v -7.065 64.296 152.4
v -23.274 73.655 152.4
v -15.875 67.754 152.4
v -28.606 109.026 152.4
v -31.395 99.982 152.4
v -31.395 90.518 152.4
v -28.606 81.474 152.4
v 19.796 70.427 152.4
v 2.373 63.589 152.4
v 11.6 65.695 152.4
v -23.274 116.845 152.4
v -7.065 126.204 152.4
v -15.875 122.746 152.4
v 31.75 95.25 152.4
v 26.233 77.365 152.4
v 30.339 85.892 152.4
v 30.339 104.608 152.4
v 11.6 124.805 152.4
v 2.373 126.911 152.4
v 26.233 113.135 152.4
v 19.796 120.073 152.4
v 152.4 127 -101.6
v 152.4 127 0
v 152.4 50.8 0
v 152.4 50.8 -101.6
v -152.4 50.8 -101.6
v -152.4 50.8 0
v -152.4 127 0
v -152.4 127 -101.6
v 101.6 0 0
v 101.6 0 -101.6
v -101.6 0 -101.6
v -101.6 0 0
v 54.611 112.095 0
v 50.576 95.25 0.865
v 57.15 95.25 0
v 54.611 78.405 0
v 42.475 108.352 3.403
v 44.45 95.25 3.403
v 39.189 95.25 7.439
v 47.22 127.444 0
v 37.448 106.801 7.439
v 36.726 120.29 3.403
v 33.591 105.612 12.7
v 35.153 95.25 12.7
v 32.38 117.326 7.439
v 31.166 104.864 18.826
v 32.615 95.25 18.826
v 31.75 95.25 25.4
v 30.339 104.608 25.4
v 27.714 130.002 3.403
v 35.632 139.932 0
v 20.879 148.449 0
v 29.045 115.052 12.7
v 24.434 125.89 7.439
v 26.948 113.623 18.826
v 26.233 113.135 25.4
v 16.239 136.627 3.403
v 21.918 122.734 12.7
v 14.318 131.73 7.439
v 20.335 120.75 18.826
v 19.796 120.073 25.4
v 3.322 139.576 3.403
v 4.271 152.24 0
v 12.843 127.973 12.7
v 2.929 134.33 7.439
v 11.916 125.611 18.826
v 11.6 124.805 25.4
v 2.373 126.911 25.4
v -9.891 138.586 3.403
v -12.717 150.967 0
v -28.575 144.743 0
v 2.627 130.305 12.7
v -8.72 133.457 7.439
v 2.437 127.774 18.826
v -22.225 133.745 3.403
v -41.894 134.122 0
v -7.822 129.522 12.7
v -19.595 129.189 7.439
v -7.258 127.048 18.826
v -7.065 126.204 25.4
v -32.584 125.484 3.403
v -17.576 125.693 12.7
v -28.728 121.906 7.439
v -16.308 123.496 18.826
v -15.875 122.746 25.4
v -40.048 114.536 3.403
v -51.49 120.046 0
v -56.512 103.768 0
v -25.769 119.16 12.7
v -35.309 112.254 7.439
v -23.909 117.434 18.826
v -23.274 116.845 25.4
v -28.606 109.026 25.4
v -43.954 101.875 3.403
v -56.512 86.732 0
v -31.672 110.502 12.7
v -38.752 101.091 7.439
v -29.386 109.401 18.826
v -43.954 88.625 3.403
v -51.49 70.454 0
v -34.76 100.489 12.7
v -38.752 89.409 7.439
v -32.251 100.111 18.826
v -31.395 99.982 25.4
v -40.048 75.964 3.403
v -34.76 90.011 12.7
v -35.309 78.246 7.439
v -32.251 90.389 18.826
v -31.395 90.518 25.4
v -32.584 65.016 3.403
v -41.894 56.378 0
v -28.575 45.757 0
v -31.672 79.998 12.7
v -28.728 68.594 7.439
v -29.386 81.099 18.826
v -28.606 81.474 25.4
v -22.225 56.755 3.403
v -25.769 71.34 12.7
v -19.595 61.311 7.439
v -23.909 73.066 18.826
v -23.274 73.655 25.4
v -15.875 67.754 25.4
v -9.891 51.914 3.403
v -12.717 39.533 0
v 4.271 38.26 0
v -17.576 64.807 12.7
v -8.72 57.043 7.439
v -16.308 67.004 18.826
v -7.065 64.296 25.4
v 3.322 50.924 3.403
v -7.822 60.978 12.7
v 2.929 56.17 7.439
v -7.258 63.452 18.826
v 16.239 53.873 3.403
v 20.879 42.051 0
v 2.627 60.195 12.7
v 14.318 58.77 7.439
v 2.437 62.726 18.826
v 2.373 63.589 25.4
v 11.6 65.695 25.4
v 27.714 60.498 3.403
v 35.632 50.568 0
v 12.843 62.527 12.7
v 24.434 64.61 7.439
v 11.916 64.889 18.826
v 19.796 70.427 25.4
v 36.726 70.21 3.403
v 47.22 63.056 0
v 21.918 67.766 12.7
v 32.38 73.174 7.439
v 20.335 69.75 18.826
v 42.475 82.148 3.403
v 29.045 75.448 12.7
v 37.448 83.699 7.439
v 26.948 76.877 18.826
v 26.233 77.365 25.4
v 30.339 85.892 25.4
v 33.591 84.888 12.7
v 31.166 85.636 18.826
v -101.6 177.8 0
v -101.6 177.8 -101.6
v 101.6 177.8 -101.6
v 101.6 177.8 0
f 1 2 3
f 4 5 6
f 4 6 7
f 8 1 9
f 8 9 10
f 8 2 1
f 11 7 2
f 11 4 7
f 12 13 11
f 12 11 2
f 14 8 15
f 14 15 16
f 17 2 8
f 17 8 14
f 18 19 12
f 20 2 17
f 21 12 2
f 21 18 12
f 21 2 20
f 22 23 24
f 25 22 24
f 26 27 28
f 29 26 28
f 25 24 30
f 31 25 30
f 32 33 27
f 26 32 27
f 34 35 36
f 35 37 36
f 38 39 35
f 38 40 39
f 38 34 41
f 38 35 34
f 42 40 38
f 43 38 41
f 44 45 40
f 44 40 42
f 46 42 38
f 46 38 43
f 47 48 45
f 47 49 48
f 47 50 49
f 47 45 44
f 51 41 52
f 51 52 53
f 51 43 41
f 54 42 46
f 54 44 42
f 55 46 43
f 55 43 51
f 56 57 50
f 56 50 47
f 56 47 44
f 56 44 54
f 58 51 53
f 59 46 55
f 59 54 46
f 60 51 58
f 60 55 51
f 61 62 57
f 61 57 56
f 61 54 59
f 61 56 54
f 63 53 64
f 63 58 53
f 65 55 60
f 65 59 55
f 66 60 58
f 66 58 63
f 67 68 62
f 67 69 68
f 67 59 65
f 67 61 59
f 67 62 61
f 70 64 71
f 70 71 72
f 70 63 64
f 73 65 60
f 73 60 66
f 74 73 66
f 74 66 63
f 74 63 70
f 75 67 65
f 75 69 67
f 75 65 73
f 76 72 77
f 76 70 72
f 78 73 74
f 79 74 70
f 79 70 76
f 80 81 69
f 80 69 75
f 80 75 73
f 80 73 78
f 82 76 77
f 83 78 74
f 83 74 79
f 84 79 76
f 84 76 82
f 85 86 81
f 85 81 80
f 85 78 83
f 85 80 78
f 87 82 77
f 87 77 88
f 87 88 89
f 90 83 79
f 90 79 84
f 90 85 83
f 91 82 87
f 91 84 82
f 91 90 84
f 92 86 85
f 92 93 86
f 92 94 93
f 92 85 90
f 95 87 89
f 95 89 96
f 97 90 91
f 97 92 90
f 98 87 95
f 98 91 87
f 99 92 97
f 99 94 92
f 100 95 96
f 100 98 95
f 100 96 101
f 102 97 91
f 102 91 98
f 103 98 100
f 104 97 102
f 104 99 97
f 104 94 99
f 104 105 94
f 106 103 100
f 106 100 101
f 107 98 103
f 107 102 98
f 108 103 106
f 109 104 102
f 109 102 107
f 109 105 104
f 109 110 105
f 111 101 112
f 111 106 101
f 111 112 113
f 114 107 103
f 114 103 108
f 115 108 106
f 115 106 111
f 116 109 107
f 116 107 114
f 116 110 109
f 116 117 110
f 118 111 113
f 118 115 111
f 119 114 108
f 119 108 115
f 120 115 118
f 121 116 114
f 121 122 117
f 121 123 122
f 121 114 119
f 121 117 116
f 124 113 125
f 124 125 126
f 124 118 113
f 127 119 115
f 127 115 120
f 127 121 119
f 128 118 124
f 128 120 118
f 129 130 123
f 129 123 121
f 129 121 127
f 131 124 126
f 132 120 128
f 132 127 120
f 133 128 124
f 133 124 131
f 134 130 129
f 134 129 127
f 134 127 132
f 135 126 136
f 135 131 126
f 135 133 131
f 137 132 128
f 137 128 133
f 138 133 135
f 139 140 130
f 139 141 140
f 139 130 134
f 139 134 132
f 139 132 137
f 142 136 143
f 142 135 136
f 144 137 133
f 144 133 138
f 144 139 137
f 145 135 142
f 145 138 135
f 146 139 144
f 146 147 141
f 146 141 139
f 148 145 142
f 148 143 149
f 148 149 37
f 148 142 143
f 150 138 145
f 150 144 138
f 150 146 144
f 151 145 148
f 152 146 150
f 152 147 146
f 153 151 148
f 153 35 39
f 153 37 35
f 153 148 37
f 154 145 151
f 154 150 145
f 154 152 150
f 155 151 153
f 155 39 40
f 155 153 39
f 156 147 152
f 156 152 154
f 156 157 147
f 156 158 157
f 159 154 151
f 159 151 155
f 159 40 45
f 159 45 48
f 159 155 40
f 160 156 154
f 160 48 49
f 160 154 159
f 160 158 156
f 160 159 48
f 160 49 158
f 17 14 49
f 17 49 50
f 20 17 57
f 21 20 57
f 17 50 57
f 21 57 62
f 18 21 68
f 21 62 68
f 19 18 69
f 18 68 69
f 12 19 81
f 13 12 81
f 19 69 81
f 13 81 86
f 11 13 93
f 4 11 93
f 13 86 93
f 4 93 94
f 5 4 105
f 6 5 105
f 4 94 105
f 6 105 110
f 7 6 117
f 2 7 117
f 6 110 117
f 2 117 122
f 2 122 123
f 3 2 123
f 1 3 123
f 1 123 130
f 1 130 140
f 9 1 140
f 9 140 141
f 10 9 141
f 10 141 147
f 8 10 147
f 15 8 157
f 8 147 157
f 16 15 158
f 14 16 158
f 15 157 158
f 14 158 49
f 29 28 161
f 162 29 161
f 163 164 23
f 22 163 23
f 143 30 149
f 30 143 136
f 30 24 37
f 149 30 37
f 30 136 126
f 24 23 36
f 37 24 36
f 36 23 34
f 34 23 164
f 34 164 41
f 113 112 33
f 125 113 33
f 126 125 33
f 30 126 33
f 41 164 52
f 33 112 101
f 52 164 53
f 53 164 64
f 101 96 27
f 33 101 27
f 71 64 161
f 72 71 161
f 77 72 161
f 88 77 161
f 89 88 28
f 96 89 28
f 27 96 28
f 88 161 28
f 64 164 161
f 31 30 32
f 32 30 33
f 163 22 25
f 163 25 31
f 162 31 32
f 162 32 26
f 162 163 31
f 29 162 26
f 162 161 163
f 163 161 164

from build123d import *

# Parameters (mm, degrees)
SKETCH1_R           = 31.75
BOSS_EXTRUDE1_DEPTH = 152.4
BOSS_EXTRUDE2_DEPTH = 101.6
FILLET1_R           = 25.4


with BuildPart() as part:
    # Sketch1 → Boss-Extrude1 (new body)
    with BuildSketch(Plane.XY):
        with Locations((0, 95.25)):
            Circle(SKETCH1_R)
    extrude(amount=BOSS_EXTRUDE1_DEPTH)

    # Sketch2 → Boss-Extrude2 (add)
    with BuildSketch(Plane(origin=(0, 0, 0), x_dir=(-1, 0, 0), z_dir=(0, 0, -1))):
        Polygon((-101.6, 177.8), (-152.4, 127), (-152.4, 50.8), (-101.6, 0), (101.6, 0), (152.4, 50.8), (152.4, 127), (101.6, 177.8), align=None)
    extrude(amount=BOSS_EXTRUDE2_DEPTH)

    # Fillet1
    fillet1_edges = [part.edges().sort_by_distance(p)[0] for p in [
        (-31.75, 95.25, 0),
    ]]
    fillet(fillet1_edges, radius=FILLET1_R)


solid = part.part
